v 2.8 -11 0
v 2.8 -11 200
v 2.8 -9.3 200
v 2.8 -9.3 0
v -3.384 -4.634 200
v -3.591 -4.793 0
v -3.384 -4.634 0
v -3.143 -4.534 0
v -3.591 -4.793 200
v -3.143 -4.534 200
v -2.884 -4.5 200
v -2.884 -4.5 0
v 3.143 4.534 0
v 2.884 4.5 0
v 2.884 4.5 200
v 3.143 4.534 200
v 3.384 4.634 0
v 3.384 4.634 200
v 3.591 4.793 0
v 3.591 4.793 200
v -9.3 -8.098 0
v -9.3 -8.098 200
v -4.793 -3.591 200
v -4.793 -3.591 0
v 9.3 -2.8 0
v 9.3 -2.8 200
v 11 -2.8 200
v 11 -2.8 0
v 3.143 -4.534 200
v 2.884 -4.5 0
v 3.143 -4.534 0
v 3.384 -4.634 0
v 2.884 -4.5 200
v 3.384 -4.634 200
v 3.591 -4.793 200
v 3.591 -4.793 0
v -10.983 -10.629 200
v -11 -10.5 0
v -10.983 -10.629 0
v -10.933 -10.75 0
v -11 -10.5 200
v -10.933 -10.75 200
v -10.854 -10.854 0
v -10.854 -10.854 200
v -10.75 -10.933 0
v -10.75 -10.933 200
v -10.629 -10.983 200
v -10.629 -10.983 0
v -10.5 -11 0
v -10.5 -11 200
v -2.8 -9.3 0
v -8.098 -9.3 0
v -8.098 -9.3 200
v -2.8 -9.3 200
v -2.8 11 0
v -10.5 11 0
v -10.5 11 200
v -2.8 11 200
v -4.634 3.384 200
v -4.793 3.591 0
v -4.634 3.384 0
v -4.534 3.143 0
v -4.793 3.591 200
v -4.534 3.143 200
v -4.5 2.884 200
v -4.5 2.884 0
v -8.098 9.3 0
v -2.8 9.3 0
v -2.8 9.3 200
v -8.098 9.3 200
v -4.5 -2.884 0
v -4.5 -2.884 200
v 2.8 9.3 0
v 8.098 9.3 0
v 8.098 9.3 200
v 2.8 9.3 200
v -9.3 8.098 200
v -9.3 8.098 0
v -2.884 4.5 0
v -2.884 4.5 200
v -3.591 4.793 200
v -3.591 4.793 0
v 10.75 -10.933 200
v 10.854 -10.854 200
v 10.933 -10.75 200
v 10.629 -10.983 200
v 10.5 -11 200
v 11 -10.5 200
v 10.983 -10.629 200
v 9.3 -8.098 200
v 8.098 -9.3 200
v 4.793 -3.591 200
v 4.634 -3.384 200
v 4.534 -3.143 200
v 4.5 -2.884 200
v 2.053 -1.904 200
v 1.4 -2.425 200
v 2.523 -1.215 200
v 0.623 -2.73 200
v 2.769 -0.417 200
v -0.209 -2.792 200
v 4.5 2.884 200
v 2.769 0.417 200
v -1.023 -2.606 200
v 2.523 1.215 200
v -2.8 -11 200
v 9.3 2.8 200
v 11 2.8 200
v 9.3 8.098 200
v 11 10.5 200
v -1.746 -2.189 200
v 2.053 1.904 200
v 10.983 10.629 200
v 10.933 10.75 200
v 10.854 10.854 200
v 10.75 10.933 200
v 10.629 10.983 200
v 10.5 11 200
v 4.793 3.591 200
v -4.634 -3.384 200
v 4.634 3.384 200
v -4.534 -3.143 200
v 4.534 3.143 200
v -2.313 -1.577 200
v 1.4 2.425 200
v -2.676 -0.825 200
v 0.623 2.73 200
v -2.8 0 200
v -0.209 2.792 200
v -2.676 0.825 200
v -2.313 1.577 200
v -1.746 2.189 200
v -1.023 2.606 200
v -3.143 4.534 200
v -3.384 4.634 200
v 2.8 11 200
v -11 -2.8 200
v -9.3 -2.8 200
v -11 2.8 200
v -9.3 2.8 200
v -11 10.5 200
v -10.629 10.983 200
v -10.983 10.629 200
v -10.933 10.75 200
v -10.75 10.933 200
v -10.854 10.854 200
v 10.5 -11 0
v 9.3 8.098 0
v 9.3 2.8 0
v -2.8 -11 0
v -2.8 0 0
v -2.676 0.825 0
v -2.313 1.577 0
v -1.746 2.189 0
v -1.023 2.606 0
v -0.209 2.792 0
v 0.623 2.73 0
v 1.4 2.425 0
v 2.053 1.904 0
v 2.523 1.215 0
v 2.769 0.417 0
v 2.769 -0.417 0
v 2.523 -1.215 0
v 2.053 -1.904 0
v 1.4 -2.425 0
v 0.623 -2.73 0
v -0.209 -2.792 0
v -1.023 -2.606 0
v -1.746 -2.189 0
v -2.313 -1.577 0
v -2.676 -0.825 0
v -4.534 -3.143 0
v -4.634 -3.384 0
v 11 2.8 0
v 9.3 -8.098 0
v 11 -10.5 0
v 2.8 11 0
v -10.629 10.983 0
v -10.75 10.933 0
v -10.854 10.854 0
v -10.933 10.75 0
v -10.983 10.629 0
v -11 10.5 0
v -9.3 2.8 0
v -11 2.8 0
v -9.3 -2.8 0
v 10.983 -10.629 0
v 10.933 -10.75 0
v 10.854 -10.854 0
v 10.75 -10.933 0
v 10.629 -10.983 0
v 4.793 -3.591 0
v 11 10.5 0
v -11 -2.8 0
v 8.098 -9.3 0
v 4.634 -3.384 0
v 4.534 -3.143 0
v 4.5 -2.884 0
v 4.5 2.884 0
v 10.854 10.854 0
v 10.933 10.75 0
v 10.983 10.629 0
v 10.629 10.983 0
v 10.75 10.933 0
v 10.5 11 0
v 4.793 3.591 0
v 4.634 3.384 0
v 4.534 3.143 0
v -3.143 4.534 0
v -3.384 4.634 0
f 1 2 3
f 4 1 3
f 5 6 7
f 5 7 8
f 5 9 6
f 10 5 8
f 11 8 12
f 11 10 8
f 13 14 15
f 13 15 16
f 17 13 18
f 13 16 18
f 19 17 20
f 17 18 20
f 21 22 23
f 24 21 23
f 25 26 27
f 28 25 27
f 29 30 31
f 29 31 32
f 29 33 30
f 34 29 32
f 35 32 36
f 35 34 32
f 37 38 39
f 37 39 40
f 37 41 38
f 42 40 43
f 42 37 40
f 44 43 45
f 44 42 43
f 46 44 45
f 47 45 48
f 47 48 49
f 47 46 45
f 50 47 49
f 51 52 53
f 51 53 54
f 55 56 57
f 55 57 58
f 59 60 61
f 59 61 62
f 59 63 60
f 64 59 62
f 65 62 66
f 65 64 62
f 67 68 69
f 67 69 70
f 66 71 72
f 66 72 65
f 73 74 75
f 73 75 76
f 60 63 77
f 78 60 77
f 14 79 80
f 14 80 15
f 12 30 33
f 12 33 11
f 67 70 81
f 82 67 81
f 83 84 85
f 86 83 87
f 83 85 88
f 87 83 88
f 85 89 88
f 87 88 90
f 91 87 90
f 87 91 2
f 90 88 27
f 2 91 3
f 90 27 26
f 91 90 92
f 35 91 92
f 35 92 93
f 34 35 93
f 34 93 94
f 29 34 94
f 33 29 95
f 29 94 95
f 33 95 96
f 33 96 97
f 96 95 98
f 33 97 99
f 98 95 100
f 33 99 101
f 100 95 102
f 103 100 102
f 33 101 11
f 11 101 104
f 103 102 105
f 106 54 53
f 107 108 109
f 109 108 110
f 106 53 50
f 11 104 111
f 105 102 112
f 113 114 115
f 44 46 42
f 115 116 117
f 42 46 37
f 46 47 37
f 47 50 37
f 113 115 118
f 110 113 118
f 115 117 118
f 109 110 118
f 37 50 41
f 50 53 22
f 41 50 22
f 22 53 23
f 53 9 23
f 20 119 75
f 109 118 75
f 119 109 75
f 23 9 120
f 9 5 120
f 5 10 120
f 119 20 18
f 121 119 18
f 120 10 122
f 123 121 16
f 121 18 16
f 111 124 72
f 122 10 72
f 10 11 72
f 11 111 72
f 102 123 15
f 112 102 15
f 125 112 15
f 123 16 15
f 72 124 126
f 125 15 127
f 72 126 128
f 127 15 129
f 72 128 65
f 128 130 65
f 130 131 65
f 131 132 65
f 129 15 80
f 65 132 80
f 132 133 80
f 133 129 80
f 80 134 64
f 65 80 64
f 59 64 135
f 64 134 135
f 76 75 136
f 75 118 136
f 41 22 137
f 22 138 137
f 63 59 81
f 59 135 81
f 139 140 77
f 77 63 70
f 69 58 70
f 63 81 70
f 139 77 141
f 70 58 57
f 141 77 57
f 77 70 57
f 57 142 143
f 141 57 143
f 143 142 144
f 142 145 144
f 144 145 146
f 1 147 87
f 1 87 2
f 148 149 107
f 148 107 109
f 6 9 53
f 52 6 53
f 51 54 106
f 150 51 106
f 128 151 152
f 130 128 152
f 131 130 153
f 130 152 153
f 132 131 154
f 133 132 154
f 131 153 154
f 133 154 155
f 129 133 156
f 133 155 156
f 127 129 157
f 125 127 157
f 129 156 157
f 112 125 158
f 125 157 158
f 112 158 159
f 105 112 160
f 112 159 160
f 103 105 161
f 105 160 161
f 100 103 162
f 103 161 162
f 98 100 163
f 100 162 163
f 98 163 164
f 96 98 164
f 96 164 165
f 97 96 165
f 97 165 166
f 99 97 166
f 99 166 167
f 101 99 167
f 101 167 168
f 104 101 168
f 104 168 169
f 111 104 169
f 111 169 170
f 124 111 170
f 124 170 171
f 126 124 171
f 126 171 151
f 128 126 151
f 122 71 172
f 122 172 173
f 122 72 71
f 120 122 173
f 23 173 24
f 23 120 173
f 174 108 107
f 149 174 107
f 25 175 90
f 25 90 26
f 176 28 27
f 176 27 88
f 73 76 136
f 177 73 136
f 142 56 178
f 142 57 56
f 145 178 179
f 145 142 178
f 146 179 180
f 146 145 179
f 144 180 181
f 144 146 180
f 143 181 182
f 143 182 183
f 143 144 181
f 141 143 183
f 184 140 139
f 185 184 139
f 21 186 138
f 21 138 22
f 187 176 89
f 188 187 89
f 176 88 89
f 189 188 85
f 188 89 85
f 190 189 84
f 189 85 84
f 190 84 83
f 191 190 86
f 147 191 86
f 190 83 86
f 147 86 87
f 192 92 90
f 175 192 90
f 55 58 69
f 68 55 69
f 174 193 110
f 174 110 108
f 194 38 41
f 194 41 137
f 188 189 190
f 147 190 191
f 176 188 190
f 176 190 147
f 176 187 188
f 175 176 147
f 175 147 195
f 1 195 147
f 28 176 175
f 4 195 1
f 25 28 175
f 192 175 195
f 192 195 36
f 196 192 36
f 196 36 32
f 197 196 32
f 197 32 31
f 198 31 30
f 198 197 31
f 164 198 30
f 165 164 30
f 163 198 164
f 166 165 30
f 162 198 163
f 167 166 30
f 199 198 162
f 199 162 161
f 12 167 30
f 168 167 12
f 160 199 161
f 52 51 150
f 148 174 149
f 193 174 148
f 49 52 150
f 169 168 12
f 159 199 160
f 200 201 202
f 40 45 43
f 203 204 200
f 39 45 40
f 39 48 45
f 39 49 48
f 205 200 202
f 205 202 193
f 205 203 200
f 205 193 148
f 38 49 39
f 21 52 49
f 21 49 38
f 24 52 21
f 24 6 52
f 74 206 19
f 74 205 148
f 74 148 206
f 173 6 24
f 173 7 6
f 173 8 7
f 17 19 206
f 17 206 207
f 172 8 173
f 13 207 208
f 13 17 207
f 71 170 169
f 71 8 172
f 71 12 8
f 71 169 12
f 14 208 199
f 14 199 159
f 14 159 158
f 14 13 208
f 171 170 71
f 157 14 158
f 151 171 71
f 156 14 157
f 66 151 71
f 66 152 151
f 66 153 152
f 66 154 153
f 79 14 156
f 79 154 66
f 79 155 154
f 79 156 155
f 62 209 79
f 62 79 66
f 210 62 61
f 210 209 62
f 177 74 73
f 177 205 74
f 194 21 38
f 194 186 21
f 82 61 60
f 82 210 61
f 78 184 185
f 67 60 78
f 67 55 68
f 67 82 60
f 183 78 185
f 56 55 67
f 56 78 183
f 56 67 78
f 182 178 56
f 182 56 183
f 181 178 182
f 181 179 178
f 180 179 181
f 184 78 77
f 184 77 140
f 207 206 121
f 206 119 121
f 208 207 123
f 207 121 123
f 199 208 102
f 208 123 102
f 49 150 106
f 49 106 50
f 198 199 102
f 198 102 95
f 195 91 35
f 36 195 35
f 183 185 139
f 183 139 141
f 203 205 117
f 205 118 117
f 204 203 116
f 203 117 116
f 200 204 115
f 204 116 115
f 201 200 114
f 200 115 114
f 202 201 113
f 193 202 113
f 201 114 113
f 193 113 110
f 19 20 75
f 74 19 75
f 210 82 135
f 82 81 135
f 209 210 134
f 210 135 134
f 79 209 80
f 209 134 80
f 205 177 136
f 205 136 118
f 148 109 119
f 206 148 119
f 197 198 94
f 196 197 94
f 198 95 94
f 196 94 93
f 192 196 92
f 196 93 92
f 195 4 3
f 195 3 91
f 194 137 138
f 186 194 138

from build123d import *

# Parameters (mm, degrees)
EXTRUSION1_DEPTH        = 200
ESQUISSE2_R             = 2.8
ENL_V_MAT_EXTRU_1_DEPTH = 201
CONG_1_R                = 0.5
CONG_2_R                = 1


with BuildPart() as part:
    # Esquisse1 → Extrusion1 (new body)
    with BuildSketch(Plane.XY):
        Polygon((-2.8, 11), (-2.8, 9.3), (-8.097918472, 9.3), (-3.297918472, 4.5), (3.297918472, 4.5), (8.097918472, 9.3), (2.8, 9.3), (2.8, 11), (11, 11), (11, 2.8), (9.3, 2.8), (9.3, 8.097918472), (4.5, 3.297918472), (4.5, -3.297918472), (9.3, -8.097918472), (9.3, -2.8), (11, -2.8), (11, -11), (2.8, -11), (2.8, -9.3), (8.097918472, -9.3), (3.297918472, -4.5), (-3.297918472, -4.5), (-8.097918472, -9.3), (-2.8, -9.3), (-2.8, -11), (-11, -11), (-11, -2.8), (-9.3, -2.8), (-9.3, -8.097918472), (-4.5, -3.297918472), (-4.5, 3.297918472), (-9.3, 8.097918472), (-9.3, 2.8), (-11, 2.8), (-11, 11), align=None)
    extrude(amount=EXTRUSION1_DEPTH)

    # Esquisse2 → Enlèv. mat.-Extru.1 (cut, through all)
    with BuildSketch(Plane(origin=(0, 0, 0), x_dir=(-1, 0, 0), z_dir=(0, 0, -1))):
        Circle(ESQUISSE2_R)
    extrude(amount=-ENL_V_MAT_EXTRU_1_DEPTH, mode=Mode.SUBTRACT)

    # Congé1
    cong_1_edges = [part.edges().sort_by_distance(p)[0] for p in [
        (-11, 11, 100),
        (11, 11, 100),
        (11, -11, 100),
        (-11, -11, 100),
    ]]
    fillet(cong_1_edges, radius=CONG_1_R)

    # Congé2
    cong_2_edges = [part.edges().sort_by_distance(p)[0] for p in [
        (-4.5, -3.297918472, 100),
        (-4.5, 3.297918472, 100),
        (-3.297918472, 4.5, 100),
        (3.297918472, 4.5, 100),
        (4.5, 3.297918472, 100),
        (4.5, -3.297918472, 100),
        (3.297918472, -4.5, 100),
        (-3.297918472, -4.5, 100),
    ]]
    fillet(cong_2_edges, radius=CONG_2_R)


solid = part.part
